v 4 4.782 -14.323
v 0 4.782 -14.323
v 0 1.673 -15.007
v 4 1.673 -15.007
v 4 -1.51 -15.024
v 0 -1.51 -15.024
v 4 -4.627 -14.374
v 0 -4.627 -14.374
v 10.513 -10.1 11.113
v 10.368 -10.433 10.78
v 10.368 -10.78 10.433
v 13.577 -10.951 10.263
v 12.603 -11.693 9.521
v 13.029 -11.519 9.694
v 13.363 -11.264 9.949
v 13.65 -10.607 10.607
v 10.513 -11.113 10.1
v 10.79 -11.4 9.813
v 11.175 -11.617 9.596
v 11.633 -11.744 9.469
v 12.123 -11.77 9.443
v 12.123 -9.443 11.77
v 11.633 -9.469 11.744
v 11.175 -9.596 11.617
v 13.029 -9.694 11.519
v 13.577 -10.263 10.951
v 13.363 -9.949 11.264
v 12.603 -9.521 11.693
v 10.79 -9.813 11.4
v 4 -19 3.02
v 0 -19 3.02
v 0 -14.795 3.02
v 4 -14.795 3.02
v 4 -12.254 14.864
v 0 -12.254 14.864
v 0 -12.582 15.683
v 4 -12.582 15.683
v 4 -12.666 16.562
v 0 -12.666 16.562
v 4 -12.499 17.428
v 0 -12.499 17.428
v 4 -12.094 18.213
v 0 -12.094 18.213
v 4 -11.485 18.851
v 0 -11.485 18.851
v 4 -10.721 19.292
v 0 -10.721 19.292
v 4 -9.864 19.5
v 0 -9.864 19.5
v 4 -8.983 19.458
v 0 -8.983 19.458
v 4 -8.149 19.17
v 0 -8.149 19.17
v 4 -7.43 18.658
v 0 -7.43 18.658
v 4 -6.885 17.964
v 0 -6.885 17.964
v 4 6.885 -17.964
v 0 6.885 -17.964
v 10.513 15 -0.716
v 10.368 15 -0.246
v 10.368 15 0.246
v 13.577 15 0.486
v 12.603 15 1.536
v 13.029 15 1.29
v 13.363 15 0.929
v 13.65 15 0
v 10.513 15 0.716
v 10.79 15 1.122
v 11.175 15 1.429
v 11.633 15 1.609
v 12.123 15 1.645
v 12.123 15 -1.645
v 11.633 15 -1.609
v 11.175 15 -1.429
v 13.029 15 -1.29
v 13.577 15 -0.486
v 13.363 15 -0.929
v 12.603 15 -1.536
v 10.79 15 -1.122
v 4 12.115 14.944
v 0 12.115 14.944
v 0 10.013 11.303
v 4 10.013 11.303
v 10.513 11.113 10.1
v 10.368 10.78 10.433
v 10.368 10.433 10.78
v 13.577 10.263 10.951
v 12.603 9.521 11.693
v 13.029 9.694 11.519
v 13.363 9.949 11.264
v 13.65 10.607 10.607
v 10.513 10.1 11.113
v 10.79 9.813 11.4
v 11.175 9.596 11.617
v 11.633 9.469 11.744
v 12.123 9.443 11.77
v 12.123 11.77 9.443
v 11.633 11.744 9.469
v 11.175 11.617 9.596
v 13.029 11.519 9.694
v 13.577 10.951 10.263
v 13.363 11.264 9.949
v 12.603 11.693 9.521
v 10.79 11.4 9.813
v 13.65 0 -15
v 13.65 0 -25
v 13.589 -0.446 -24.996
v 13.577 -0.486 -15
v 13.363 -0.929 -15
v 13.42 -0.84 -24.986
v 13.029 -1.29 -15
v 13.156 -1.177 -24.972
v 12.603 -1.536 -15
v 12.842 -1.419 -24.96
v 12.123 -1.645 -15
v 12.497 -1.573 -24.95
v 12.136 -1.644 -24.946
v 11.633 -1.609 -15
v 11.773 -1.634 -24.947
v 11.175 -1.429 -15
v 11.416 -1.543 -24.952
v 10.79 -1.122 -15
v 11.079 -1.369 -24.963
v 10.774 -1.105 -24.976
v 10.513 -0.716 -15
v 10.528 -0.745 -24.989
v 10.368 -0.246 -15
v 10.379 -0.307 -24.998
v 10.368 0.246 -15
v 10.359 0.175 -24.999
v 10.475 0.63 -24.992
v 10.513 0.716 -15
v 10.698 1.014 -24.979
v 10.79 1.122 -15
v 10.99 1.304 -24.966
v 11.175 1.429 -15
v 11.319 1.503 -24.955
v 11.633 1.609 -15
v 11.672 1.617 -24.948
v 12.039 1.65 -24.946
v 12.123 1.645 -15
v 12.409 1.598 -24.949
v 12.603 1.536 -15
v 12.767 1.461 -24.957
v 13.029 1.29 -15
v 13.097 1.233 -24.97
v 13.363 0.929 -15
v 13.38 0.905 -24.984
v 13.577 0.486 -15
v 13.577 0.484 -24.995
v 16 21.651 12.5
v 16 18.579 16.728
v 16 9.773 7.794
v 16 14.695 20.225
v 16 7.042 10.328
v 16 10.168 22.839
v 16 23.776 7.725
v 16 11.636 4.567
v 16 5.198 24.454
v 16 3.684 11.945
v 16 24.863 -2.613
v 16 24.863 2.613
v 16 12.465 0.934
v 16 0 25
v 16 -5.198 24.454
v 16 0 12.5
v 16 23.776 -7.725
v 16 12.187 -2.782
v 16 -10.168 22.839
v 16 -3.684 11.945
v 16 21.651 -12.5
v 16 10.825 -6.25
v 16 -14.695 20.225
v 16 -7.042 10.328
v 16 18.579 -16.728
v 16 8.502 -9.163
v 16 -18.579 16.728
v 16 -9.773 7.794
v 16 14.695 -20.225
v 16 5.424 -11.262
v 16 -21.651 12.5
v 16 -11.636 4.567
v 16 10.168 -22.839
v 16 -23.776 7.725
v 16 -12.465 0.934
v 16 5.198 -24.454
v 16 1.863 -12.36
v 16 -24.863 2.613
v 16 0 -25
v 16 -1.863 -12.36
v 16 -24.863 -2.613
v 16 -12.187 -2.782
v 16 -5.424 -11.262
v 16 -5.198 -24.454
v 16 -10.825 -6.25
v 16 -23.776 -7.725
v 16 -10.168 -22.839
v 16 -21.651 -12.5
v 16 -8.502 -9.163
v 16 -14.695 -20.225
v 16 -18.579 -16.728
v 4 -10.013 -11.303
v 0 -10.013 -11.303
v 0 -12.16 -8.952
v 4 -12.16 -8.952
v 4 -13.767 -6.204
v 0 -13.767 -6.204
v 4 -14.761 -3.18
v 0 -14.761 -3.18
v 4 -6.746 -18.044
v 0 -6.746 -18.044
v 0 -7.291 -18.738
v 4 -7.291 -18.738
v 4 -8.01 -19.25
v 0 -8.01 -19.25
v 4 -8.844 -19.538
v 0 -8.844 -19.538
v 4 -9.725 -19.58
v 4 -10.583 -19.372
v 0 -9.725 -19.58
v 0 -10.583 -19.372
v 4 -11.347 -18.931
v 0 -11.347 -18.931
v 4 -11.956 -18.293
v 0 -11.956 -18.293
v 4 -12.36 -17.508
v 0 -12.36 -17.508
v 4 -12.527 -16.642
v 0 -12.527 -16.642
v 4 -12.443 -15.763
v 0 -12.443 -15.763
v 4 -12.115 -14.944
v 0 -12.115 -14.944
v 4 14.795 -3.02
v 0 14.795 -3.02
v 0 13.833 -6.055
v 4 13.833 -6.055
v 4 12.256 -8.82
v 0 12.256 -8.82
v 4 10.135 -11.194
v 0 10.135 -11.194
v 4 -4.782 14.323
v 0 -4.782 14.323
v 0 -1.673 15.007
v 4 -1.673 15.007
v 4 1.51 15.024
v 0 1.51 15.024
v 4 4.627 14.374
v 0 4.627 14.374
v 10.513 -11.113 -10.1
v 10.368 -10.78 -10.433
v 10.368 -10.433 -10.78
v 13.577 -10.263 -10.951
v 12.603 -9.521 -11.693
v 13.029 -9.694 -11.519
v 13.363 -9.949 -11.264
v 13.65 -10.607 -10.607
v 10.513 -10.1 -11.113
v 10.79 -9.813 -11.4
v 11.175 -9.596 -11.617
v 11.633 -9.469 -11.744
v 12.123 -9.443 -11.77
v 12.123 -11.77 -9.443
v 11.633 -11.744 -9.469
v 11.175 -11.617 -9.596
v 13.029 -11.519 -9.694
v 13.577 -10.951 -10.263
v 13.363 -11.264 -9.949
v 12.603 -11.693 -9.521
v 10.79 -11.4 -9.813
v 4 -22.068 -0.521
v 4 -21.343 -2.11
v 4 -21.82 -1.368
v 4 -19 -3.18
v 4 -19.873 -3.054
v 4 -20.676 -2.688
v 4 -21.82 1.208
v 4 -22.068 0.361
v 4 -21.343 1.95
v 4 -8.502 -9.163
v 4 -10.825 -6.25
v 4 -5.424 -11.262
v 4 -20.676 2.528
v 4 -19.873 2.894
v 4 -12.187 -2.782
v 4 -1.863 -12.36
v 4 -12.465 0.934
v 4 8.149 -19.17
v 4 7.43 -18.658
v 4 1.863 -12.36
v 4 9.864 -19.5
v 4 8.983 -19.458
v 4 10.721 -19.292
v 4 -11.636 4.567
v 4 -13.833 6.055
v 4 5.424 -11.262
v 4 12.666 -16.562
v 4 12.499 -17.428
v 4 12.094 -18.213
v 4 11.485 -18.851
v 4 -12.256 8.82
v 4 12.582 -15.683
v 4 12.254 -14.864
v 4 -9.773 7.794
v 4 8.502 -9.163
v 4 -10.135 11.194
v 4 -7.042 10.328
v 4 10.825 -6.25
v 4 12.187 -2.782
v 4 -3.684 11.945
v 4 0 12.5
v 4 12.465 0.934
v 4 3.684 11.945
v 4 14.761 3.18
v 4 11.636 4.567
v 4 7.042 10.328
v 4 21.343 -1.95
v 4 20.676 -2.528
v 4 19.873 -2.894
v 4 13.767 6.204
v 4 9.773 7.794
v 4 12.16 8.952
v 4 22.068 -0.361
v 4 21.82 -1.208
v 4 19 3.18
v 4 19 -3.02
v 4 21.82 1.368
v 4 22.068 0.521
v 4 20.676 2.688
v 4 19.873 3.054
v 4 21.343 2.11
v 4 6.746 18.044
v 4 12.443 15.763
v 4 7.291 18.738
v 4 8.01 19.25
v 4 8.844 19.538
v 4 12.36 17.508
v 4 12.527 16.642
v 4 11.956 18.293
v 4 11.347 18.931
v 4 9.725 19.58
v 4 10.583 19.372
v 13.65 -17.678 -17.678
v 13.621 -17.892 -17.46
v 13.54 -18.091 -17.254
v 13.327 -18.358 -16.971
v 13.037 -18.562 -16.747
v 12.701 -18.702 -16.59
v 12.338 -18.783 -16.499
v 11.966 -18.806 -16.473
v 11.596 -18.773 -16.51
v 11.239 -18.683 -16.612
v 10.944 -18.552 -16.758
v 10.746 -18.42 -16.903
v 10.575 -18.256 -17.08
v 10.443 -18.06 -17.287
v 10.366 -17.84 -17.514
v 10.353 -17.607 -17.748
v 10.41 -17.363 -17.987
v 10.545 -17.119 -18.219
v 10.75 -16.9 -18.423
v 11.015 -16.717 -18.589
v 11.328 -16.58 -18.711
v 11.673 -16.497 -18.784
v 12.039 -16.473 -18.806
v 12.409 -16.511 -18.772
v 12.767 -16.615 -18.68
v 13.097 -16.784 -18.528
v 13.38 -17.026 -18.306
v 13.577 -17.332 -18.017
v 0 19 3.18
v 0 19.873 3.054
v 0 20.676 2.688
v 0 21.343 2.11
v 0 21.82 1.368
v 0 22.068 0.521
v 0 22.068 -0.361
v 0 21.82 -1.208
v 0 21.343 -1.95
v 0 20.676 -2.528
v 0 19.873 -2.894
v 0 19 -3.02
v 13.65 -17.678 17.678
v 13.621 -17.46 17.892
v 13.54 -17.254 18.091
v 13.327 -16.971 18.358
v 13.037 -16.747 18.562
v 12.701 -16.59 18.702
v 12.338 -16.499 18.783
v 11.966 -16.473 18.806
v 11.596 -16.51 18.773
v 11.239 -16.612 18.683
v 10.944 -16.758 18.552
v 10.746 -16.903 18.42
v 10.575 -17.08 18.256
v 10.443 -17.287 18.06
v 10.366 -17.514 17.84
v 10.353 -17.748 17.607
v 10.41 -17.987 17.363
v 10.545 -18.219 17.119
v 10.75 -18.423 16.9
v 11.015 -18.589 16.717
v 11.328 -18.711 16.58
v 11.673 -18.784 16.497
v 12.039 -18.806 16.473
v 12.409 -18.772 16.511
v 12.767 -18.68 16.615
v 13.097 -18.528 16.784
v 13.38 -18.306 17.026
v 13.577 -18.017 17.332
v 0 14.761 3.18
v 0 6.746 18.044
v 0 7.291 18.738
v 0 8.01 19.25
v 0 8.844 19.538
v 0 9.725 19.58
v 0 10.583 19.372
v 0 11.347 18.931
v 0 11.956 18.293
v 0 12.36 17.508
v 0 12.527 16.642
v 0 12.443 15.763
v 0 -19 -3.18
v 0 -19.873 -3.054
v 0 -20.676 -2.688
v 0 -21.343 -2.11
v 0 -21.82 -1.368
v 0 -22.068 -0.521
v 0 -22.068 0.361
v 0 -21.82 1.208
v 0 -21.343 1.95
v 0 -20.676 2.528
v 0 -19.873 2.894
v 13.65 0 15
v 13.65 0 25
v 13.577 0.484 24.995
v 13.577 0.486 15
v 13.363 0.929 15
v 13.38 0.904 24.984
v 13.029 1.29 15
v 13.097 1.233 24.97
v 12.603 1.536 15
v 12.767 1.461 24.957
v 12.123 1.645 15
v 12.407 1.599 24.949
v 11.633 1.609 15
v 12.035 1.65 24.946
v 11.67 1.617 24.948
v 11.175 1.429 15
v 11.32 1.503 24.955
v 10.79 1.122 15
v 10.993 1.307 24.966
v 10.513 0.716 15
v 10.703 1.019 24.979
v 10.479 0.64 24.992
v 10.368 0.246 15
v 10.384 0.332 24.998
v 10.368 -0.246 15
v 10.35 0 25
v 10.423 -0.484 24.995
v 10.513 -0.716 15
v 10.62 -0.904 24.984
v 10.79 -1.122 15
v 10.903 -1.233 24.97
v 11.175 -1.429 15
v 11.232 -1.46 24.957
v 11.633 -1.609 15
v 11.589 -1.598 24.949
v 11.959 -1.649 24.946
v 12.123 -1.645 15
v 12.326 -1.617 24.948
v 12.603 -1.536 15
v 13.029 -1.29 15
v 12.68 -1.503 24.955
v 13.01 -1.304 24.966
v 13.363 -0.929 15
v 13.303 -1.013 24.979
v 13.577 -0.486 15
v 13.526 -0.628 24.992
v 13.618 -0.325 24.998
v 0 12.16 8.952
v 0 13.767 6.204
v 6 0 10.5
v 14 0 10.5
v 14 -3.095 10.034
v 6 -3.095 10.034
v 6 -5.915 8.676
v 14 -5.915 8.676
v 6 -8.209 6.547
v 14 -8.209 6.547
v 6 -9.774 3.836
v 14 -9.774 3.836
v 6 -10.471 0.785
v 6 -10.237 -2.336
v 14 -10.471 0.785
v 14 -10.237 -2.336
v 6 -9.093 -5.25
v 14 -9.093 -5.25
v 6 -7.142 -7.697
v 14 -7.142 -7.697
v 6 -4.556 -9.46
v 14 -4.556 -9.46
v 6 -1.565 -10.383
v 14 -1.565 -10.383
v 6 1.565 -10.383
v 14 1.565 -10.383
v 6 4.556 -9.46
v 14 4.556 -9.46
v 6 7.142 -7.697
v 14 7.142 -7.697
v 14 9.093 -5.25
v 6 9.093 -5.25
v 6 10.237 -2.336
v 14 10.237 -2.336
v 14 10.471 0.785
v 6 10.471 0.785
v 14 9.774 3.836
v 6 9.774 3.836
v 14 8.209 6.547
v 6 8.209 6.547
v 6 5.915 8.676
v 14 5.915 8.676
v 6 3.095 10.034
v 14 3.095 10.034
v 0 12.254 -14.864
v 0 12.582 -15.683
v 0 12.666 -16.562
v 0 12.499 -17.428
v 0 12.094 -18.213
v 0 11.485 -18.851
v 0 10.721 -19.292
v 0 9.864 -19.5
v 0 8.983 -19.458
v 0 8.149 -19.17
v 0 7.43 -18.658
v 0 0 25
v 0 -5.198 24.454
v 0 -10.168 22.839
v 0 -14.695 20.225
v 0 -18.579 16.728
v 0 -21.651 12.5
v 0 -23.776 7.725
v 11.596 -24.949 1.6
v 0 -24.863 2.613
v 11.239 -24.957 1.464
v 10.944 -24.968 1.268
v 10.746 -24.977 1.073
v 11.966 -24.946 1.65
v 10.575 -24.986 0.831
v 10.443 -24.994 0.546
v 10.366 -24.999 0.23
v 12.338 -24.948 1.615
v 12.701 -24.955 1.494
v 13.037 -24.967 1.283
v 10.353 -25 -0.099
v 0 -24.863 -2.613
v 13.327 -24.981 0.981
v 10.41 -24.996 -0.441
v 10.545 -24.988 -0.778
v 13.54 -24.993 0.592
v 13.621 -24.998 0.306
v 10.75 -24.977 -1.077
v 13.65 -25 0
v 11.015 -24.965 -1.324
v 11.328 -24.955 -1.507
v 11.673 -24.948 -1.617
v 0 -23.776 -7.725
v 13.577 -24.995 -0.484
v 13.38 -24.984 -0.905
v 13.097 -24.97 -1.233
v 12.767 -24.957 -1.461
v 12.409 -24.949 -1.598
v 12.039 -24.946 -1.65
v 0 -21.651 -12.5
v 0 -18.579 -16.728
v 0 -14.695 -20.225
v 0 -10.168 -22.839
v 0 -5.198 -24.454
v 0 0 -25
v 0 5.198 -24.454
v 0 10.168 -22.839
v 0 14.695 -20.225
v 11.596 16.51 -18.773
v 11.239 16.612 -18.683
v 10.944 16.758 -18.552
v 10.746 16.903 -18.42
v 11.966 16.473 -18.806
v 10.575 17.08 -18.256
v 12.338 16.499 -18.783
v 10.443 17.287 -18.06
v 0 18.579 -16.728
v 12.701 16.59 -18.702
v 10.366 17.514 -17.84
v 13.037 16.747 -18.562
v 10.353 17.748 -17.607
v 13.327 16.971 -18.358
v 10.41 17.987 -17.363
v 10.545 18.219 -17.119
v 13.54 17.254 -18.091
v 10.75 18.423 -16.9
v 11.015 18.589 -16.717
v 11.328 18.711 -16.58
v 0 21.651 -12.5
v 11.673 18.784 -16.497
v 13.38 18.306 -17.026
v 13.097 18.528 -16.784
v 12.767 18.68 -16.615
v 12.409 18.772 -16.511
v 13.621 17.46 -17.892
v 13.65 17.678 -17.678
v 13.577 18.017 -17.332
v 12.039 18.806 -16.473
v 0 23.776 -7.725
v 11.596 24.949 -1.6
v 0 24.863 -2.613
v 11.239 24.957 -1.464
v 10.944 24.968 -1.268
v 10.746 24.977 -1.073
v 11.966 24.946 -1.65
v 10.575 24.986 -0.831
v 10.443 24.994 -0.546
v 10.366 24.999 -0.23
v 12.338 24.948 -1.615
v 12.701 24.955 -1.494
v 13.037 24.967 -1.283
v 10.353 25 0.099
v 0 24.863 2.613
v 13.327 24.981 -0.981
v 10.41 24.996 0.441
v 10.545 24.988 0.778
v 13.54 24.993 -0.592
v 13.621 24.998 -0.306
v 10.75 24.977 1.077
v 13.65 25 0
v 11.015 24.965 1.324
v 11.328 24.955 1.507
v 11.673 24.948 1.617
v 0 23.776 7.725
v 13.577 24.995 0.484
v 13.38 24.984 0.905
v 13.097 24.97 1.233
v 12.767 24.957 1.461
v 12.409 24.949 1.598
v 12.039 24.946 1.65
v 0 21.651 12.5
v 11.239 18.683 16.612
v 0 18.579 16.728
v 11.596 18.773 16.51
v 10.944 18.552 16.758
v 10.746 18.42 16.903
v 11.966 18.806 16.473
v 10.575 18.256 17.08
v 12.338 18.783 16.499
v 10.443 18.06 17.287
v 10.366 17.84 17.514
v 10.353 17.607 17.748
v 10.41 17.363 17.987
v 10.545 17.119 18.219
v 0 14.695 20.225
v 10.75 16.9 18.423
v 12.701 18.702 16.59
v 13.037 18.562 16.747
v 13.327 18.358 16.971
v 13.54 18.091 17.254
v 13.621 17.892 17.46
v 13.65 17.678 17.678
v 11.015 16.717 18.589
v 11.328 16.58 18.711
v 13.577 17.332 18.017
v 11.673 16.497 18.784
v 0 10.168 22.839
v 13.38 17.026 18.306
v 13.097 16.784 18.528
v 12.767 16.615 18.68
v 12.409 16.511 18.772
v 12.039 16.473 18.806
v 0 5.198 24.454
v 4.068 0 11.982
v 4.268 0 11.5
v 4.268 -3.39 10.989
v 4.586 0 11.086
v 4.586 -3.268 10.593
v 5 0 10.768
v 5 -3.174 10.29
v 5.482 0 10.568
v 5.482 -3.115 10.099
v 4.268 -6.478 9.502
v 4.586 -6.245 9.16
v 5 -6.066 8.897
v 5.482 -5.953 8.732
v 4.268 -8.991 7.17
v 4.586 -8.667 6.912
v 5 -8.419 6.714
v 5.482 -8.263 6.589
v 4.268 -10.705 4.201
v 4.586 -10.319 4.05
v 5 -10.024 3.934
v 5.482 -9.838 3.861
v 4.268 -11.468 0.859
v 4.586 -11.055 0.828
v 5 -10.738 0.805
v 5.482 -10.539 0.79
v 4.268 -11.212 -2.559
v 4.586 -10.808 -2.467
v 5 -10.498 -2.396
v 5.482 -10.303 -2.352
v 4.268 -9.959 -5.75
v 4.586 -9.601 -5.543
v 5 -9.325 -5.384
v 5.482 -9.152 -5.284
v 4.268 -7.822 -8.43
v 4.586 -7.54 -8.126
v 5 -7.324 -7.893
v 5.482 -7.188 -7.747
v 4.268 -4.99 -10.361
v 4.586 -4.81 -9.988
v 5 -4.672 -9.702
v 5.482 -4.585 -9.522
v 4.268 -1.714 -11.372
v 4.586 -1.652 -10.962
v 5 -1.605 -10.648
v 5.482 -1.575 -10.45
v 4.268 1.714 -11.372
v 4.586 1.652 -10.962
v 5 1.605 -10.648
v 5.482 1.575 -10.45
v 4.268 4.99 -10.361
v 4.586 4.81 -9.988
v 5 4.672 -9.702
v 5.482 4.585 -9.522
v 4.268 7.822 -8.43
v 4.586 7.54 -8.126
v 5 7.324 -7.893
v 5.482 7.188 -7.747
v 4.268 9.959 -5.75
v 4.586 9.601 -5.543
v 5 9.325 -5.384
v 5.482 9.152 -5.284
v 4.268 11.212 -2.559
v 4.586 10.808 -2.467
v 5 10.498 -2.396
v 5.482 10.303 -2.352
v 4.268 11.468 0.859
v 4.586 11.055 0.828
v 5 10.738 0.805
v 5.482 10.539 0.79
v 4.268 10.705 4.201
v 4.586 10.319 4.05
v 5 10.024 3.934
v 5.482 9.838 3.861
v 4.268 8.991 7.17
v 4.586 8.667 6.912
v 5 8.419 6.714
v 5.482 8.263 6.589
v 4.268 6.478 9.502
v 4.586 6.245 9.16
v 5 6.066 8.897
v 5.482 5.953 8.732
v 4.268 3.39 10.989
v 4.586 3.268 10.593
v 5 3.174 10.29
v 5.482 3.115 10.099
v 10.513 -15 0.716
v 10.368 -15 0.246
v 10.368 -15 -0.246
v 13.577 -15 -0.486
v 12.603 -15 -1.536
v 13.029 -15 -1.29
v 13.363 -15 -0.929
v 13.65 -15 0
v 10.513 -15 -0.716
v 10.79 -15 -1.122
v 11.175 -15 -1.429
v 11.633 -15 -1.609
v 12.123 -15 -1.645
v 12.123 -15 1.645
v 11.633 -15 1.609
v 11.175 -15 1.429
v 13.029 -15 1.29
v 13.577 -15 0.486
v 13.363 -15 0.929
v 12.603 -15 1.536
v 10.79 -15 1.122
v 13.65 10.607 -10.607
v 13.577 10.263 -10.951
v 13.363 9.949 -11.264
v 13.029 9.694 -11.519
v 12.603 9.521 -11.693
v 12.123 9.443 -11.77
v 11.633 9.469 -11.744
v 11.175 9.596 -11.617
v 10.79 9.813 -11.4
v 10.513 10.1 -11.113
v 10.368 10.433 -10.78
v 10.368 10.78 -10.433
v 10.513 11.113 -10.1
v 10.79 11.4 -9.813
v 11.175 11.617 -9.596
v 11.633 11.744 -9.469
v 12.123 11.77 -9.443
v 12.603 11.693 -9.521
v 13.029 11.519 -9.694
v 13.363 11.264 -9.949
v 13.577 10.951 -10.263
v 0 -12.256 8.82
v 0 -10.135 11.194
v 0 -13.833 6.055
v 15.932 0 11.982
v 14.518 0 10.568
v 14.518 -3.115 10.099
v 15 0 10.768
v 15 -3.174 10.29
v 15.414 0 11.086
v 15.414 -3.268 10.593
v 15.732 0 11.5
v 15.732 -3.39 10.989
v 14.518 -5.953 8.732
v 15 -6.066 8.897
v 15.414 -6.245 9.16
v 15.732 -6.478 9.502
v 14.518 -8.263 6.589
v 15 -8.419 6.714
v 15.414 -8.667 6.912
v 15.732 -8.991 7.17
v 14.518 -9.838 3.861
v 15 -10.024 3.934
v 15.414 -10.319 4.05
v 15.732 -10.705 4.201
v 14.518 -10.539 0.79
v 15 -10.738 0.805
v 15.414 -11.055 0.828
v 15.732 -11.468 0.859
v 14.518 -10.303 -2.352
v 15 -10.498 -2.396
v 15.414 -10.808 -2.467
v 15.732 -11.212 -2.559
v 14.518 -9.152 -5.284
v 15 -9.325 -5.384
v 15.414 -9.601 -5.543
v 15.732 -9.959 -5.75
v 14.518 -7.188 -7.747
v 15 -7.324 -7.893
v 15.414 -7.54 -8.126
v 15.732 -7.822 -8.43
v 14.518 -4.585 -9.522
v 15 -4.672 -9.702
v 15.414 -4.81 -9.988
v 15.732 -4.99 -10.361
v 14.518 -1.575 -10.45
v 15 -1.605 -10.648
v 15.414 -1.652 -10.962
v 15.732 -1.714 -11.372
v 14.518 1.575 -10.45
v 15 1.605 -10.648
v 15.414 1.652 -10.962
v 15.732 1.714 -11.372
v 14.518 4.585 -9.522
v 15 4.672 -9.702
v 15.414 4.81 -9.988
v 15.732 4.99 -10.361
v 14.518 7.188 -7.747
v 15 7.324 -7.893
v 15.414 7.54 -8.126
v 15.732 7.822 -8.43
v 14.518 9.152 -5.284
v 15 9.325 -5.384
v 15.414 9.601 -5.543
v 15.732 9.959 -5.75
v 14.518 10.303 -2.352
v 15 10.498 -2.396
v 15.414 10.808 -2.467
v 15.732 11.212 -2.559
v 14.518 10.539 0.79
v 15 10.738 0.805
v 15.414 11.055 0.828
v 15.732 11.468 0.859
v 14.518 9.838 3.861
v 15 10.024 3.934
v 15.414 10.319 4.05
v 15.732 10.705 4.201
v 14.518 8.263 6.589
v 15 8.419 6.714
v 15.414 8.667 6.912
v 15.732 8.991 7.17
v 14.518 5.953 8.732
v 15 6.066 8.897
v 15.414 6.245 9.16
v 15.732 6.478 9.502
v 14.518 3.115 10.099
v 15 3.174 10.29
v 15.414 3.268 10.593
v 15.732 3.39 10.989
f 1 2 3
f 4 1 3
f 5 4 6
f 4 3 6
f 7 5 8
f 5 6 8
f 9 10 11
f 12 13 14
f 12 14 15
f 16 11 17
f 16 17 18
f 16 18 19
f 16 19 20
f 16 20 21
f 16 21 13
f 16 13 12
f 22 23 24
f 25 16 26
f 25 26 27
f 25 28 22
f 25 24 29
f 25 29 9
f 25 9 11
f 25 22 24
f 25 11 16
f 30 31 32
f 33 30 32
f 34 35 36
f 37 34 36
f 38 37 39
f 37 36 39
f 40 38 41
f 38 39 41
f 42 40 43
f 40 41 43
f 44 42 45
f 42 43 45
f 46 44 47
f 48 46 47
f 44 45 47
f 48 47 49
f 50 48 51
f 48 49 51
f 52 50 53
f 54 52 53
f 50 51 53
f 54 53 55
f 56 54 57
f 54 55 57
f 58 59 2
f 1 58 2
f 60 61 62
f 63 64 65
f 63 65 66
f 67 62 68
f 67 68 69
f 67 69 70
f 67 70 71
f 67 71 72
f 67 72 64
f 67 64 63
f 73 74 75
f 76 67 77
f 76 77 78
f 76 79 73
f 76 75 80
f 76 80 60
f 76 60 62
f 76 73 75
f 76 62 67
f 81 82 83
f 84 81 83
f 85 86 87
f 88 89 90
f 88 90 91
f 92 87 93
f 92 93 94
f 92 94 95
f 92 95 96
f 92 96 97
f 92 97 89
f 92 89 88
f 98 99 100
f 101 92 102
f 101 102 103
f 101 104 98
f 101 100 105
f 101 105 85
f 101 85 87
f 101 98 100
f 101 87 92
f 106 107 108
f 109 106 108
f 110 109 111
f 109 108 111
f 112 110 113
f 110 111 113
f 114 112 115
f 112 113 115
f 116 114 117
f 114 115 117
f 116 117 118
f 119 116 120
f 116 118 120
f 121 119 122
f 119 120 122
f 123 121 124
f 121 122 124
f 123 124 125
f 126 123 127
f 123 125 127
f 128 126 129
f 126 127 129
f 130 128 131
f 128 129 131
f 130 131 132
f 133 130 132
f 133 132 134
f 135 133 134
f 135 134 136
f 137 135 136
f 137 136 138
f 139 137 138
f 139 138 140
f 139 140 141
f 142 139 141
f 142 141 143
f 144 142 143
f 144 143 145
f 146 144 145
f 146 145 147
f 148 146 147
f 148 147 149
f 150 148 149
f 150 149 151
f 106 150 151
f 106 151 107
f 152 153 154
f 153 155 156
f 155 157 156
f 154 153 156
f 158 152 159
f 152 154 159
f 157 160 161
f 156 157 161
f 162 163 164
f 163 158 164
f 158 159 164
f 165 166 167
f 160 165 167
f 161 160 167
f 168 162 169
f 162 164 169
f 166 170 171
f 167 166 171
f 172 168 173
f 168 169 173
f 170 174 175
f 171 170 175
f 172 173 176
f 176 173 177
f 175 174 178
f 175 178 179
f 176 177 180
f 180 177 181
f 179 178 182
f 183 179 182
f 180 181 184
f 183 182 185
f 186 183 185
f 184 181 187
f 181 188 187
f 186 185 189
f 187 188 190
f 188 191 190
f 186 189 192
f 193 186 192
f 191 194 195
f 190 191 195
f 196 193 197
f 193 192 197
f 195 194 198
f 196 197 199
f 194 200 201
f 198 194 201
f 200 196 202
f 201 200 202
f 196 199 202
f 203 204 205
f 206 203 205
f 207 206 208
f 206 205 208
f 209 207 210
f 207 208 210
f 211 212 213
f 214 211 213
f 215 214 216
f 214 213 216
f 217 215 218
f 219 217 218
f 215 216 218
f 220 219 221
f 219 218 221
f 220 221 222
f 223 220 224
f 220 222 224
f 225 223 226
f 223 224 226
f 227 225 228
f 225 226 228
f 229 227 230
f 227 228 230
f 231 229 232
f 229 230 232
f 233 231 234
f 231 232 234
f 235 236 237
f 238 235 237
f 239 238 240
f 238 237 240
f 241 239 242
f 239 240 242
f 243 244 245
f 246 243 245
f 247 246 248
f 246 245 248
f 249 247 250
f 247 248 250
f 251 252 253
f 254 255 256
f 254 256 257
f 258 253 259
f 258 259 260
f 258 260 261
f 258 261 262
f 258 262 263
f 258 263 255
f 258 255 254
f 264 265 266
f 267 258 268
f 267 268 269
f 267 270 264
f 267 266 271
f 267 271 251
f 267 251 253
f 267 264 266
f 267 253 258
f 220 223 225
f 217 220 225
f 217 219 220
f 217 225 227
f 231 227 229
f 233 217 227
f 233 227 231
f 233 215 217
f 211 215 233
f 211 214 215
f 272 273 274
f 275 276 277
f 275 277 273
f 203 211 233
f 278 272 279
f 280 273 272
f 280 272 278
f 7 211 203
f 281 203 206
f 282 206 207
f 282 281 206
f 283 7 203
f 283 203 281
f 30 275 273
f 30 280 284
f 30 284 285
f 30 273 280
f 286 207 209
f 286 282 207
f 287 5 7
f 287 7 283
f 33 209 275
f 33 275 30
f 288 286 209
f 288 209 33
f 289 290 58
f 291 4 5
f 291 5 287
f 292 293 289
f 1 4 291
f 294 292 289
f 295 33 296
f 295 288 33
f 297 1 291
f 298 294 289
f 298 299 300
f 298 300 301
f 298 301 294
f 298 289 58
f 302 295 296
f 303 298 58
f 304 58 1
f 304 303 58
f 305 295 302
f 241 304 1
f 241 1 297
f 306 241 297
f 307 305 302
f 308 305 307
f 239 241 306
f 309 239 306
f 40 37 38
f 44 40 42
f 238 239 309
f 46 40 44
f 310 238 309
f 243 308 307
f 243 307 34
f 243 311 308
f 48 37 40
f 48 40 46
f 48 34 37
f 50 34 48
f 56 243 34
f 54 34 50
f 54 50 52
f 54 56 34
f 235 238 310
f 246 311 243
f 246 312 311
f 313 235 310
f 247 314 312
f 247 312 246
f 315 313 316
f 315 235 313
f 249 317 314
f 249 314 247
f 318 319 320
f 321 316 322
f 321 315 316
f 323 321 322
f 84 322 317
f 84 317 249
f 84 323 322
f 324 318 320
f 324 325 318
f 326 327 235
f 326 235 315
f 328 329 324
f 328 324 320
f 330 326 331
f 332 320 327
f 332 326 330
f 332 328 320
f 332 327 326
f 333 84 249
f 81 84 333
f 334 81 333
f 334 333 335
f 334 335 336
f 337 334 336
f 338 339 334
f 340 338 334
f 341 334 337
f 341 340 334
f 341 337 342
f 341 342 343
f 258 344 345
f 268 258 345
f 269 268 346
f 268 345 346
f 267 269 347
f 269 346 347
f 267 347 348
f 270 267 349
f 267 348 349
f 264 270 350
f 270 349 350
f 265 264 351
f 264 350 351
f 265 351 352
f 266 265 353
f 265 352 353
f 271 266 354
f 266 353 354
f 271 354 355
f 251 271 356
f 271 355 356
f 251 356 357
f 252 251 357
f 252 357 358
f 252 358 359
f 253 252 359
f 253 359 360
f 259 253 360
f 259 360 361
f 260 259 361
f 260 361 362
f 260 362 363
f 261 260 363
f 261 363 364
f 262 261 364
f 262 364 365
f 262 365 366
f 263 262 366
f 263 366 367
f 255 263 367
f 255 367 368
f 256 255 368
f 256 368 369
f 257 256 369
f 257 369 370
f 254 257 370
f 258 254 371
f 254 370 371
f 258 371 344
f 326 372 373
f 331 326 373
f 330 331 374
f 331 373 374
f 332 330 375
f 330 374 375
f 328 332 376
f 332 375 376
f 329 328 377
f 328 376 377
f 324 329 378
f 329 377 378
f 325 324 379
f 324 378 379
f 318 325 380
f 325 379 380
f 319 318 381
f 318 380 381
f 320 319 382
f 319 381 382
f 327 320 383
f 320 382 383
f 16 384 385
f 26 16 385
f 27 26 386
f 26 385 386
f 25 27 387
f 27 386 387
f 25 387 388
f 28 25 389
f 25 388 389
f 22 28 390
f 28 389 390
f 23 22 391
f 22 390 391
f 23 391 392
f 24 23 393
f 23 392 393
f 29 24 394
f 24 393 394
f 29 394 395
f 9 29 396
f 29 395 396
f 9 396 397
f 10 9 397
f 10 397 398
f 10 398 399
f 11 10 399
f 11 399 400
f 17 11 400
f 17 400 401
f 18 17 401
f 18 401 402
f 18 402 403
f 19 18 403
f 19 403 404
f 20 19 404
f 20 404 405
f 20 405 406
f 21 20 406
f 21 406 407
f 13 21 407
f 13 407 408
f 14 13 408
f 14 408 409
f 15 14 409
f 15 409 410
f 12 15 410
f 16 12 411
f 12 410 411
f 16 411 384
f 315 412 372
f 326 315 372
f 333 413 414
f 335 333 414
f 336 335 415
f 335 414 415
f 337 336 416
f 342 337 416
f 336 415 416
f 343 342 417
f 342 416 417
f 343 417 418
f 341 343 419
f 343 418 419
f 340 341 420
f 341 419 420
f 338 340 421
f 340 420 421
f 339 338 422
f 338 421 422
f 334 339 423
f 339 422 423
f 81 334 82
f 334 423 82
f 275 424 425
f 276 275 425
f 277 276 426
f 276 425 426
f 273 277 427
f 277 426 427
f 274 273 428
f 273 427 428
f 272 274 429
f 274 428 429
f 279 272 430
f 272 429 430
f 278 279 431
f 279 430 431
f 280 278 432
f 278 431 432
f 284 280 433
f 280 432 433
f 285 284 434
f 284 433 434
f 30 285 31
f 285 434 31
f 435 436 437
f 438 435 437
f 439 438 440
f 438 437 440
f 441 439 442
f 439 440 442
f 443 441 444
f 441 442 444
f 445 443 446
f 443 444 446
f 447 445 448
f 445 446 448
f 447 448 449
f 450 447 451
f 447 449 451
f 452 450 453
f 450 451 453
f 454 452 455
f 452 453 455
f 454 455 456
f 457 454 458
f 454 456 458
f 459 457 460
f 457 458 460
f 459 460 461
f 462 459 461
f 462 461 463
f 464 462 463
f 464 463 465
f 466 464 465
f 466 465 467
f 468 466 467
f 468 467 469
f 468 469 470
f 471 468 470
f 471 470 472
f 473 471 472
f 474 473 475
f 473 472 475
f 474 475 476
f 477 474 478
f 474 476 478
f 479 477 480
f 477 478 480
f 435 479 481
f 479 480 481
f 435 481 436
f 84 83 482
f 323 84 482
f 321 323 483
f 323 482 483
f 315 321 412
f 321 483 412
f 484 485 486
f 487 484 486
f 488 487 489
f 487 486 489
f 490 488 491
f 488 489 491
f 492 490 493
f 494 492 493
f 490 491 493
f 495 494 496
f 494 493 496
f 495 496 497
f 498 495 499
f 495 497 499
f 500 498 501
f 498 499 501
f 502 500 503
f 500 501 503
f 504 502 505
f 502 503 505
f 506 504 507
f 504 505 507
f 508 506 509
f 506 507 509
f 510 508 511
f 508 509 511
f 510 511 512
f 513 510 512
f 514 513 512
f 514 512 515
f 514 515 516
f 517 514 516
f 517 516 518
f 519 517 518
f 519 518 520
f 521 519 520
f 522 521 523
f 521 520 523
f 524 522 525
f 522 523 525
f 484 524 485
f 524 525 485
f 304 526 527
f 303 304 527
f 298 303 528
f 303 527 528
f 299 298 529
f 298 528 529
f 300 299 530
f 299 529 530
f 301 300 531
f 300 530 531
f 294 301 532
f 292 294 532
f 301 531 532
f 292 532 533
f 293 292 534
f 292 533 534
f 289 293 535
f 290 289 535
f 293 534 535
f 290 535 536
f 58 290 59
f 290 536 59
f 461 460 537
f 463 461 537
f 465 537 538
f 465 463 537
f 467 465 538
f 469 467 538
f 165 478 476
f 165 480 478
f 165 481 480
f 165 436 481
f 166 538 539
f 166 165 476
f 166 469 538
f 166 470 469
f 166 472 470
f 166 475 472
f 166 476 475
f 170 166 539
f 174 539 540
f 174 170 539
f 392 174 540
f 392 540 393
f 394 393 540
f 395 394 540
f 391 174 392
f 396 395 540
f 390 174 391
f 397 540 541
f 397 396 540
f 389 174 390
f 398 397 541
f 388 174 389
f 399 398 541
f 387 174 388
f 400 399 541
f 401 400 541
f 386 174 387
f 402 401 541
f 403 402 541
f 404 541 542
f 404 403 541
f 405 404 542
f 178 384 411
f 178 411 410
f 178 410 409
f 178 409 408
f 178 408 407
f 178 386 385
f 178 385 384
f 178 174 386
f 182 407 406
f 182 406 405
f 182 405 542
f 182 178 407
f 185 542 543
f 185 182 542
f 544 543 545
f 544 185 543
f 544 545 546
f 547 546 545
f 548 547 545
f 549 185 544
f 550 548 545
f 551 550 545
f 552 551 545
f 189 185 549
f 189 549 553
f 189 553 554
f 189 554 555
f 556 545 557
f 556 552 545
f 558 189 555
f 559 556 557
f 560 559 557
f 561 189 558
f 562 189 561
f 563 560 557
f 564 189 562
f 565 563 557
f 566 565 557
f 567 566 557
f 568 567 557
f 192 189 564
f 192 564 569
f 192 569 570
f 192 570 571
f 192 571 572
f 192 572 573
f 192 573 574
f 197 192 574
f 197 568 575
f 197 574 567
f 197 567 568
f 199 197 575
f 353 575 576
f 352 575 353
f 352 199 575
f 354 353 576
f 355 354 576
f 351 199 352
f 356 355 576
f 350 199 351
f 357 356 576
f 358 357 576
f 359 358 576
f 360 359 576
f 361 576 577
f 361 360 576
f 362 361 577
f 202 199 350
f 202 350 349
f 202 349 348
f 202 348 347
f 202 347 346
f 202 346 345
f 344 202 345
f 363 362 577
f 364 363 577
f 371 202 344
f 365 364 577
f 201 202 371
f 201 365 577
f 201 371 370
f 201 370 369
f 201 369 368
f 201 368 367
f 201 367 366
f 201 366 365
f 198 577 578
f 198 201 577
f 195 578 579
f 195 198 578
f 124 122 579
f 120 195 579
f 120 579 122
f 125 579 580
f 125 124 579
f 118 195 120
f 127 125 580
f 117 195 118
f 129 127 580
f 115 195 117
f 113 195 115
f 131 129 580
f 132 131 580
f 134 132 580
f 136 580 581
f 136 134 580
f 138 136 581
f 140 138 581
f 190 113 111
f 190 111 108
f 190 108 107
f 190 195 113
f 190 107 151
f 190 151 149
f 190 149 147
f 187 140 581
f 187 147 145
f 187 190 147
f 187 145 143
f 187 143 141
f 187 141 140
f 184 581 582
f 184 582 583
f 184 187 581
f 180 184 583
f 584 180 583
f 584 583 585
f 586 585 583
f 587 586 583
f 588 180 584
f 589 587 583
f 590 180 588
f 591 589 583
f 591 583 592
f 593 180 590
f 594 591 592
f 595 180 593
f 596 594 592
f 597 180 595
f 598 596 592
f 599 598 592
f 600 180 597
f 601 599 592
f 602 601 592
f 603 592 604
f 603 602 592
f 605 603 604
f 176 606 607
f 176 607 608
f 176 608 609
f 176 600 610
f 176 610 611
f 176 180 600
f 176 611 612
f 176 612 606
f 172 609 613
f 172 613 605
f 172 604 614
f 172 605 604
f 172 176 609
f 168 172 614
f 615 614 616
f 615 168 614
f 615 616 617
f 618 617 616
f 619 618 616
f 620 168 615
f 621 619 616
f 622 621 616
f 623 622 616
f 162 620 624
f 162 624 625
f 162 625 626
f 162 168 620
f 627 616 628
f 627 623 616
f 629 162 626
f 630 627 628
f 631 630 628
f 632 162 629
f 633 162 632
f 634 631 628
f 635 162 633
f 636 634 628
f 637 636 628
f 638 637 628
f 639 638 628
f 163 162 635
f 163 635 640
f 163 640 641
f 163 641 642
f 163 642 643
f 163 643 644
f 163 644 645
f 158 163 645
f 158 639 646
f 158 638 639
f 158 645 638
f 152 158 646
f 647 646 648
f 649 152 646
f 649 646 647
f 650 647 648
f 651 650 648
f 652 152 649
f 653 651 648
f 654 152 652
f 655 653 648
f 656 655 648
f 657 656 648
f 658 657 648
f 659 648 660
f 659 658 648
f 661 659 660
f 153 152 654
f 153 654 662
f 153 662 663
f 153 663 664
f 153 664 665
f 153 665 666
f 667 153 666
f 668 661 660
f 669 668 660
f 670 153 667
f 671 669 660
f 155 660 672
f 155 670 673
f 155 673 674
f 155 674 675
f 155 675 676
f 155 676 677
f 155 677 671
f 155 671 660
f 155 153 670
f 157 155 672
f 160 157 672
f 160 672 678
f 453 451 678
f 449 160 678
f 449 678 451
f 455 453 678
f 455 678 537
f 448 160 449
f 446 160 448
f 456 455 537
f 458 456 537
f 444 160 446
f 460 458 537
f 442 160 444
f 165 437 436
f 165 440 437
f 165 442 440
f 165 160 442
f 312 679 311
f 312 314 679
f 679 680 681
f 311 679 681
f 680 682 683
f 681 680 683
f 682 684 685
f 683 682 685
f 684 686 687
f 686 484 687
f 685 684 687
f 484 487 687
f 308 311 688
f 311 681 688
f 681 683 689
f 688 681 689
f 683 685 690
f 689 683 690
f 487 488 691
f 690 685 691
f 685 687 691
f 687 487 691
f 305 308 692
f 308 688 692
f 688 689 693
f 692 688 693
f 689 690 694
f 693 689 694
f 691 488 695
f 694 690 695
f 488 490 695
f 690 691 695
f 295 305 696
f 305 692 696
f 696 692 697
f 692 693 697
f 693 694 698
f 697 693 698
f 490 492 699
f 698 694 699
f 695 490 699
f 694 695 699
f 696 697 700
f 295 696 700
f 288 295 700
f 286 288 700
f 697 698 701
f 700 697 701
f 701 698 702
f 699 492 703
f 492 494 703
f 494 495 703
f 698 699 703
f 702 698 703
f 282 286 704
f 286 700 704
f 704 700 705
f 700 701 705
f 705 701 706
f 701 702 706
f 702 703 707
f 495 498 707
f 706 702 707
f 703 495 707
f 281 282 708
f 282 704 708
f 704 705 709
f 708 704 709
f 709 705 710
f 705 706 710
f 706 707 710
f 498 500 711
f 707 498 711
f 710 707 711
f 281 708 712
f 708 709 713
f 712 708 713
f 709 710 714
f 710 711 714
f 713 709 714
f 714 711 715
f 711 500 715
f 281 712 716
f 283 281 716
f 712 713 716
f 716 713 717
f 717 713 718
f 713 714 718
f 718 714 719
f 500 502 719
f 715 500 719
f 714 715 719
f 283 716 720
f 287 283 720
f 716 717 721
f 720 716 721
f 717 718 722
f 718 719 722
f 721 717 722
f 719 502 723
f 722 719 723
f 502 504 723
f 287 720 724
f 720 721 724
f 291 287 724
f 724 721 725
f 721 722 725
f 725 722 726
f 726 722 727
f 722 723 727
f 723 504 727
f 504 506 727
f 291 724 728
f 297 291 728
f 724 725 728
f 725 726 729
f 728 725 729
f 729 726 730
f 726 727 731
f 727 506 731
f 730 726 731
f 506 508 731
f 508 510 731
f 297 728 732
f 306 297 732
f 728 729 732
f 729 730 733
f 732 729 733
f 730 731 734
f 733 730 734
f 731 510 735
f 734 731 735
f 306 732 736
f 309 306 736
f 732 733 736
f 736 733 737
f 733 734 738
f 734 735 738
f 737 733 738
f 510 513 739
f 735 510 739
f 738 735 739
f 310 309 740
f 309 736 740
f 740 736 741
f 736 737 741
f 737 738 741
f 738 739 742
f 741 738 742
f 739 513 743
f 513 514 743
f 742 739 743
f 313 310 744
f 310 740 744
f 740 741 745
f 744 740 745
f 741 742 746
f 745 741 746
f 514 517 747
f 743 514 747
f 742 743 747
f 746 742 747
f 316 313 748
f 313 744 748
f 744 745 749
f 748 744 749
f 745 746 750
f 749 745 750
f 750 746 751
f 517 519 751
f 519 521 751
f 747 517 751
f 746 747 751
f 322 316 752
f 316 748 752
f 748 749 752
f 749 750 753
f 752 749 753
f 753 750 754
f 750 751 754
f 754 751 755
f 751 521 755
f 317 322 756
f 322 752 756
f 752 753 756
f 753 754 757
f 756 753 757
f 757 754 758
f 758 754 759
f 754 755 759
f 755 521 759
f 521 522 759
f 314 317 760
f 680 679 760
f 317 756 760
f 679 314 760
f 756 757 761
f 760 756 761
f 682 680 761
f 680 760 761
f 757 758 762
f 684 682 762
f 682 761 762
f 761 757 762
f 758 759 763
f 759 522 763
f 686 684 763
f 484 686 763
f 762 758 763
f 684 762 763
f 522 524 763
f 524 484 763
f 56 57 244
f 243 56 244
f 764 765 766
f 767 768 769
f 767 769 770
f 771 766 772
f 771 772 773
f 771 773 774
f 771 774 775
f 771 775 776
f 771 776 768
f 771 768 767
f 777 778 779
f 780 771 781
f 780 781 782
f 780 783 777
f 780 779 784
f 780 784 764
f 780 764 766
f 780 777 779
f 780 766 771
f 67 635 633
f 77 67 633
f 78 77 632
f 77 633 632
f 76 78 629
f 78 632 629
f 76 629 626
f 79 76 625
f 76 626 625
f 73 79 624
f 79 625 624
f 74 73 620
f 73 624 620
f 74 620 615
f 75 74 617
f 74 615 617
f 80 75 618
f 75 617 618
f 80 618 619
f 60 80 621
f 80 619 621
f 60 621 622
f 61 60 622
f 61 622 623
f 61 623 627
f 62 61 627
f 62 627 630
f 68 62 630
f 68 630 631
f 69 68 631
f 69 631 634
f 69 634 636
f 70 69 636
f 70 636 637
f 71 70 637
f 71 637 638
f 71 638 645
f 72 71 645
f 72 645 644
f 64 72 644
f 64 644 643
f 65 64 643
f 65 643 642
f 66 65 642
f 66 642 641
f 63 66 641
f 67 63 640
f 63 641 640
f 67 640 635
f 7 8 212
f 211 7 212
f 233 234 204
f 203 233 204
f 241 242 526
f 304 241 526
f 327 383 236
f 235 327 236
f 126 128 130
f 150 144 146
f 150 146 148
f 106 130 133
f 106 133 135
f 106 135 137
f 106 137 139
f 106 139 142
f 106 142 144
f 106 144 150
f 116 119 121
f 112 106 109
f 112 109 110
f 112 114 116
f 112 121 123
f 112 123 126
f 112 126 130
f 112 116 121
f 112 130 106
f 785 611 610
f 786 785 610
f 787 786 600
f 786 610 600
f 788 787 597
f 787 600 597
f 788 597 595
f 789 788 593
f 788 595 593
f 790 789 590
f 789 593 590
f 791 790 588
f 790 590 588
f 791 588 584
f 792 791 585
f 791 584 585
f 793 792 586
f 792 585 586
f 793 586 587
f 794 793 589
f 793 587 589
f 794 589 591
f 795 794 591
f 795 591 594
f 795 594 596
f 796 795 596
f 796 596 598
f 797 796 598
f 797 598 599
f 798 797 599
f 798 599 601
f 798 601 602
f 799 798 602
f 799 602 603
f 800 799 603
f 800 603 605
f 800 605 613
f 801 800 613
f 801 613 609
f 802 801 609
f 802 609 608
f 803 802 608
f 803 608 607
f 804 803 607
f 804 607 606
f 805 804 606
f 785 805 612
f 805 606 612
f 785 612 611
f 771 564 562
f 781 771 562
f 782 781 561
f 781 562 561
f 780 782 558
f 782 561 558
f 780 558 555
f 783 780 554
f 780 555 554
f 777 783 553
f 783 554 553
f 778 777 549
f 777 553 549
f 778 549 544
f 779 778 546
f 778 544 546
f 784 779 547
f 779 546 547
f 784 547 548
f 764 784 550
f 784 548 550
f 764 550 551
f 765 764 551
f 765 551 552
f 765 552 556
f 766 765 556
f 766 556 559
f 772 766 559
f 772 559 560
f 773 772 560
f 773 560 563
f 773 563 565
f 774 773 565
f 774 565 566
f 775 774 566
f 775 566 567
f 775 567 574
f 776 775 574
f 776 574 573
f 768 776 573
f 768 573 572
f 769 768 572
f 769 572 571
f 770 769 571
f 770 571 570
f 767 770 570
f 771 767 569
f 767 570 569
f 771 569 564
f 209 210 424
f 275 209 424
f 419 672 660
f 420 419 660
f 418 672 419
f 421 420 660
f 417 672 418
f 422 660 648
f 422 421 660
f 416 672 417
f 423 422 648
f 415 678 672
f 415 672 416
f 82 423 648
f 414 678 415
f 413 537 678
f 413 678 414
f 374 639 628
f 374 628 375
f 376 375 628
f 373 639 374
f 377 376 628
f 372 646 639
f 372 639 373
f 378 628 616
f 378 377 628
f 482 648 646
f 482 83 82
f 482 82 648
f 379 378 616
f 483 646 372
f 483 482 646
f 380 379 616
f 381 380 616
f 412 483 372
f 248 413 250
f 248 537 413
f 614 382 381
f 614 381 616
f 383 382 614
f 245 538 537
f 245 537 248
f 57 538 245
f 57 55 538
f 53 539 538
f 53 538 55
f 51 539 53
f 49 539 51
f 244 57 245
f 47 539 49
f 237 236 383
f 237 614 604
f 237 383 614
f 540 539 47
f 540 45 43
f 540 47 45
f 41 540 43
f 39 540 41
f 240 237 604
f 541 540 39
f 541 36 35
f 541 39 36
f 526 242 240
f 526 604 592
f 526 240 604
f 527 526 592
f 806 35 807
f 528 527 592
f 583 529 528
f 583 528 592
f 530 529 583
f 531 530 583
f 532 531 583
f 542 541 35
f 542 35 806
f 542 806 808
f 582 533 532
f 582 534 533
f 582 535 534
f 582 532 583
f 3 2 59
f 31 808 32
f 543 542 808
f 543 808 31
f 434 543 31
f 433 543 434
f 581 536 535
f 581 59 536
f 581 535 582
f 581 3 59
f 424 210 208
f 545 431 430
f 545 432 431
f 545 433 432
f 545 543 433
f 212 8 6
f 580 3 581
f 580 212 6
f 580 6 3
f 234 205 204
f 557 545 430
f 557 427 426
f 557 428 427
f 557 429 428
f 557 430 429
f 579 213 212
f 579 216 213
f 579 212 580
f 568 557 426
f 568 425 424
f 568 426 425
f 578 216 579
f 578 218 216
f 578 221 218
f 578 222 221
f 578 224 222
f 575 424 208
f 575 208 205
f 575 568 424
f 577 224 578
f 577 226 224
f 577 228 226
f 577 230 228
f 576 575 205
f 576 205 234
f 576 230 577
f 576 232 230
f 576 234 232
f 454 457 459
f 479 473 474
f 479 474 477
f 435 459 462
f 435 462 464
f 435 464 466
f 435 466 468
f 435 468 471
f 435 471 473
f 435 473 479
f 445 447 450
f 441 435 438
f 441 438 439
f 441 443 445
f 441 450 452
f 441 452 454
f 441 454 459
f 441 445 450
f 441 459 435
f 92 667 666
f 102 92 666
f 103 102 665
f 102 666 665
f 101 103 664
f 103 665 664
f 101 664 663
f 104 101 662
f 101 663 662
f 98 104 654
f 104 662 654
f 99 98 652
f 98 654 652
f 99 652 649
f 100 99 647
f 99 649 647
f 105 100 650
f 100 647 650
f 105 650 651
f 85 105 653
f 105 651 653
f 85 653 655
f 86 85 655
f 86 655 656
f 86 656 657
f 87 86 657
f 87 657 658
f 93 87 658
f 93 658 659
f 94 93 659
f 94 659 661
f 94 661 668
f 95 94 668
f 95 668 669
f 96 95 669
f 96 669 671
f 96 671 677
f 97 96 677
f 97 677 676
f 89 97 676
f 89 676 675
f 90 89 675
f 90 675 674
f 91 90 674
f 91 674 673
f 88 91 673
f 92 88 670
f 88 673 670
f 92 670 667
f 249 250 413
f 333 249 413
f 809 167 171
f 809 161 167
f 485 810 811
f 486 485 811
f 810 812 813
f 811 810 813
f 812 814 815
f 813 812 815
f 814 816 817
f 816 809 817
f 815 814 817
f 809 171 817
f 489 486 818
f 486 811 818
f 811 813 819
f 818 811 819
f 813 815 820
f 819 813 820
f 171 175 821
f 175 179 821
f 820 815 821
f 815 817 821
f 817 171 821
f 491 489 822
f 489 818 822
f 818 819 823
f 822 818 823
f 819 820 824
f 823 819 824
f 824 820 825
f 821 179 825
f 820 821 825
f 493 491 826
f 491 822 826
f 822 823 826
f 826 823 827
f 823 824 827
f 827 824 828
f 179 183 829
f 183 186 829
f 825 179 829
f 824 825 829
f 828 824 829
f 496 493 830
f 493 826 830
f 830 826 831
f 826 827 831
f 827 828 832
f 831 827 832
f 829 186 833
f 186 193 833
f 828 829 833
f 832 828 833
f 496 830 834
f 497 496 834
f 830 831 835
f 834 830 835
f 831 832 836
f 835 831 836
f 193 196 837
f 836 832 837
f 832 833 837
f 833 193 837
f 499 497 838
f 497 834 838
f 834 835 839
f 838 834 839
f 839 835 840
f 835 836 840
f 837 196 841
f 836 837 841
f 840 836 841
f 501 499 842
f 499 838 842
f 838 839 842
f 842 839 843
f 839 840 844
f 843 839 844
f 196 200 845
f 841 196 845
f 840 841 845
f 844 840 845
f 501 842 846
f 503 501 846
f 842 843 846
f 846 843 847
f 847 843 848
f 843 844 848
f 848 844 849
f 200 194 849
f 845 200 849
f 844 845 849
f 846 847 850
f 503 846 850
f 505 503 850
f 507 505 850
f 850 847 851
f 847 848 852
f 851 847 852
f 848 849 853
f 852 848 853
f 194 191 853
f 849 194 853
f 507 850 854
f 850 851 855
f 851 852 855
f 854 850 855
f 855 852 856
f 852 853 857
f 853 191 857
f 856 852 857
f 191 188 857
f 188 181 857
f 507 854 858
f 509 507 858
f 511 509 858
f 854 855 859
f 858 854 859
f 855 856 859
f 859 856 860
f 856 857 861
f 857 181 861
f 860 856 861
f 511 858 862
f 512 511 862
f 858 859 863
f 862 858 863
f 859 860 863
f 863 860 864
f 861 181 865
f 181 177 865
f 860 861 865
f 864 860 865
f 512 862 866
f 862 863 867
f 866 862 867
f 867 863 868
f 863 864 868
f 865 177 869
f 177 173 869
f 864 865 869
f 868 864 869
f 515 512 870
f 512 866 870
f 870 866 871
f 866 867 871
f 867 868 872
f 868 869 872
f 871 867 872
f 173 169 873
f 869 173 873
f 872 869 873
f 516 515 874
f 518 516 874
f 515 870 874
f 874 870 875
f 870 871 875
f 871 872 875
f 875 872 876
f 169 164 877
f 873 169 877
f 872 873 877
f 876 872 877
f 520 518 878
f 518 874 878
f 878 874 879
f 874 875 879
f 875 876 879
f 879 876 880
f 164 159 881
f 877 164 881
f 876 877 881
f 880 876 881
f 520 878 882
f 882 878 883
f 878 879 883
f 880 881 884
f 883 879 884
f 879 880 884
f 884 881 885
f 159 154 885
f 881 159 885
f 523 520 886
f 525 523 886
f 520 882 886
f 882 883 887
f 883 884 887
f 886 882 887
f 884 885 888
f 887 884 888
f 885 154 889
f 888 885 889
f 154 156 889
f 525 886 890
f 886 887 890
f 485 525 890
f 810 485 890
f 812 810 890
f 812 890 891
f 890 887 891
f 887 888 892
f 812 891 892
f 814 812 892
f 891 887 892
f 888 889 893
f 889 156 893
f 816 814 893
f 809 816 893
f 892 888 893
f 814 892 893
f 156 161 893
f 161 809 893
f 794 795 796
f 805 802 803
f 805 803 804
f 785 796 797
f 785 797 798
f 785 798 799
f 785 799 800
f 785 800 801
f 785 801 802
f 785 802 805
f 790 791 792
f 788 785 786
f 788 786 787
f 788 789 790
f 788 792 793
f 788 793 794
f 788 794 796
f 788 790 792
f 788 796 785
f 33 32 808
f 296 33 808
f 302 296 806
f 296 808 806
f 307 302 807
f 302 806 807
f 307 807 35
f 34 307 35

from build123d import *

# Parameters (mm, degrees)
ESQUISSE1_W                  = 16
ESQUISSE1_H                  = 14.5
ESQUISSE2_R                  = 4.1
ENL_V_MAT_EXTRU_1_DEPTH      = 4
CONG_2_R                     = 2
CONG_3_R                     = 2
ENL_V_START                  = 25
ESQUISSE3_R                  = 1.65
ENL_V_MAT_EXTRU_2_DEPTH      = 10
R_P_TITION_CIRCULAIRE1_COUNT = 8


with BuildPart() as part:
    # Esquisse1 → Révolution1 (revolve)
    with BuildSketch(Plane.XY, mode=Mode.PRIVATE) as r_volution1_sk:
        with Locations((8, 17.75)):
            Rectangle(ESQUISSE1_W, ESQUISSE1_H)
    revolve(r_volution1_sk.sketch.rotate(Axis((0, 0, 0), (1, 0, 0)), 90), axis=Axis((0, 0, 0), (1, 0, 0)))  # turned: the seam where the file's is

    # Esquisse2 → Enlèv. mat.-Extru.1 (cut)
    with BuildSketch(Plane.ZY):
        with BuildLine():
            Line((3.18, 14.761354951), (3.18, 18.999831578))
            ThreePointArc((3.18, 18.999831578), (0.08, 22.099831578), (-3.02, 18.999831578))
            Line((-3.02, 18.999831578), (-3.02, 14.794918046))
            ThreePointArc((-3.02, 14.794918046), (-7.479099439, 13.117662581), (-11.193708382, 10.13463826))
            Line((-11.193708382, 10.13463826), (-14.864336814, 12.253876573))
            ThreePointArc((-14.864336814, 12.253876573), (-19.099015566, 11.119197821), (-17.964336814, 6.88451907))
            Line((-17.964336814, 6.88451907), (-14.322774875, 4.782062304))
            ThreePointArc((-14.322774875, 4.782062304), (-15.099778753, 0.081741179), (-14.373708382, -4.626716692))
            Line((-14.373708382, -4.626716692), (-18.044336814, -6.745955005))
            ThreePointArc((-18.044336814, -6.745955005), (-19.179015566, -10.980633757), (-14.944336814, -12.115312509))
            Line((-14.944336814, -12.115312509), (-11.302774875, -10.012855743))
            ThreePointArc((-11.302774875, -10.012855743), (-7.620679314, -13.035921402), (-3.18, -14.761354951))
            Line((-3.18, -14.761354951), (-3.18, -18.999831578))
            ThreePointArc((-3.18, -18.999831578), (-0.08, -22.099831578), (3.02, -18.999831578))
            Line((3.02, -18.999831578), (3.02, -14.794918046))
            ThreePointArc((3.02, -14.794918046), (7.479099439, -13.117662581), (11.193708382, -10.13463826))
            Line((11.193708382, -10.13463826), (14.864336814, -12.253876573))
            ThreePointArc((14.864336814, -12.253876573), (19.099015566, -11.119197821), (17.964336814, -6.88451907))
            Line((17.964336814, -6.88451907), (14.322774875, -4.782062304))
            ThreePointArc((14.322774875, -4.782062304), (15.099778753, -0.081741179), (14.373708382, 4.626716692))
            Line((14.373708382, 4.626716692), (18.044336814, 6.745955005))
            ThreePointArc((18.044336814, 6.745955005), (19.179015566, 10.980633757), (14.944336814, 12.115312509))
            Line((14.944336814, 12.115312509), (11.302774875, 10.012855743))
            ThreePointArc((11.302774875, 10.012855743), (7.620679314, 13.035921402), (3.18, 14.761354951))
        make_face()
        Circle(ESQUISSE2_R, mode=Mode.SUBTRACT)
    extrude(amount=-ENL_V_MAT_EXTRU_1_DEPTH, mode=Mode.SUBTRACT)

    # Congé2
    cong_2_edges = [part.edges().sort_by_distance(p)[0] for p in [
        (4, 0, -10.5),
    ]]
    fillet(cong_2_edges, radius=CONG_2_R)

    # Congé3
    cong_3_edges = [part.edges().sort_by_distance(p)[0] for p in [
        (16, 0, -10.5),
    ]]
    fillet(cong_3_edges, radius=CONG_3_R)

    # Esquisse3 → Enlèv. mat.-Extru.2 (cut)
    with BuildSketch(Plane.XY.offset(ENL_V_START)):
        with Locations((12, 0)):
            Circle(ESQUISSE3_R)
    enl_v_mat_extru_2 = extrude(amount=-ENL_V_MAT_EXTRU_2_DEPTH, mode=Mode.SUBTRACT)

    # Répétition circulaire1: Enlèv. mat.-Extru.2 ×8 about axis
    r_p_tition_circulaire1_axis = Axis((0, 0, 0), (1, 0, 0))
    for i in range(1, R_P_TITION_CIRCULAIRE1_COUNT):
        add(enl_v_mat_extru_2.rotate(r_p_tition_circulaire1_axis, i * 360 / R_P_TITION_CIRCULAIRE1_COUNT), mode=Mode.SUBTRACT)


solid = part.part
